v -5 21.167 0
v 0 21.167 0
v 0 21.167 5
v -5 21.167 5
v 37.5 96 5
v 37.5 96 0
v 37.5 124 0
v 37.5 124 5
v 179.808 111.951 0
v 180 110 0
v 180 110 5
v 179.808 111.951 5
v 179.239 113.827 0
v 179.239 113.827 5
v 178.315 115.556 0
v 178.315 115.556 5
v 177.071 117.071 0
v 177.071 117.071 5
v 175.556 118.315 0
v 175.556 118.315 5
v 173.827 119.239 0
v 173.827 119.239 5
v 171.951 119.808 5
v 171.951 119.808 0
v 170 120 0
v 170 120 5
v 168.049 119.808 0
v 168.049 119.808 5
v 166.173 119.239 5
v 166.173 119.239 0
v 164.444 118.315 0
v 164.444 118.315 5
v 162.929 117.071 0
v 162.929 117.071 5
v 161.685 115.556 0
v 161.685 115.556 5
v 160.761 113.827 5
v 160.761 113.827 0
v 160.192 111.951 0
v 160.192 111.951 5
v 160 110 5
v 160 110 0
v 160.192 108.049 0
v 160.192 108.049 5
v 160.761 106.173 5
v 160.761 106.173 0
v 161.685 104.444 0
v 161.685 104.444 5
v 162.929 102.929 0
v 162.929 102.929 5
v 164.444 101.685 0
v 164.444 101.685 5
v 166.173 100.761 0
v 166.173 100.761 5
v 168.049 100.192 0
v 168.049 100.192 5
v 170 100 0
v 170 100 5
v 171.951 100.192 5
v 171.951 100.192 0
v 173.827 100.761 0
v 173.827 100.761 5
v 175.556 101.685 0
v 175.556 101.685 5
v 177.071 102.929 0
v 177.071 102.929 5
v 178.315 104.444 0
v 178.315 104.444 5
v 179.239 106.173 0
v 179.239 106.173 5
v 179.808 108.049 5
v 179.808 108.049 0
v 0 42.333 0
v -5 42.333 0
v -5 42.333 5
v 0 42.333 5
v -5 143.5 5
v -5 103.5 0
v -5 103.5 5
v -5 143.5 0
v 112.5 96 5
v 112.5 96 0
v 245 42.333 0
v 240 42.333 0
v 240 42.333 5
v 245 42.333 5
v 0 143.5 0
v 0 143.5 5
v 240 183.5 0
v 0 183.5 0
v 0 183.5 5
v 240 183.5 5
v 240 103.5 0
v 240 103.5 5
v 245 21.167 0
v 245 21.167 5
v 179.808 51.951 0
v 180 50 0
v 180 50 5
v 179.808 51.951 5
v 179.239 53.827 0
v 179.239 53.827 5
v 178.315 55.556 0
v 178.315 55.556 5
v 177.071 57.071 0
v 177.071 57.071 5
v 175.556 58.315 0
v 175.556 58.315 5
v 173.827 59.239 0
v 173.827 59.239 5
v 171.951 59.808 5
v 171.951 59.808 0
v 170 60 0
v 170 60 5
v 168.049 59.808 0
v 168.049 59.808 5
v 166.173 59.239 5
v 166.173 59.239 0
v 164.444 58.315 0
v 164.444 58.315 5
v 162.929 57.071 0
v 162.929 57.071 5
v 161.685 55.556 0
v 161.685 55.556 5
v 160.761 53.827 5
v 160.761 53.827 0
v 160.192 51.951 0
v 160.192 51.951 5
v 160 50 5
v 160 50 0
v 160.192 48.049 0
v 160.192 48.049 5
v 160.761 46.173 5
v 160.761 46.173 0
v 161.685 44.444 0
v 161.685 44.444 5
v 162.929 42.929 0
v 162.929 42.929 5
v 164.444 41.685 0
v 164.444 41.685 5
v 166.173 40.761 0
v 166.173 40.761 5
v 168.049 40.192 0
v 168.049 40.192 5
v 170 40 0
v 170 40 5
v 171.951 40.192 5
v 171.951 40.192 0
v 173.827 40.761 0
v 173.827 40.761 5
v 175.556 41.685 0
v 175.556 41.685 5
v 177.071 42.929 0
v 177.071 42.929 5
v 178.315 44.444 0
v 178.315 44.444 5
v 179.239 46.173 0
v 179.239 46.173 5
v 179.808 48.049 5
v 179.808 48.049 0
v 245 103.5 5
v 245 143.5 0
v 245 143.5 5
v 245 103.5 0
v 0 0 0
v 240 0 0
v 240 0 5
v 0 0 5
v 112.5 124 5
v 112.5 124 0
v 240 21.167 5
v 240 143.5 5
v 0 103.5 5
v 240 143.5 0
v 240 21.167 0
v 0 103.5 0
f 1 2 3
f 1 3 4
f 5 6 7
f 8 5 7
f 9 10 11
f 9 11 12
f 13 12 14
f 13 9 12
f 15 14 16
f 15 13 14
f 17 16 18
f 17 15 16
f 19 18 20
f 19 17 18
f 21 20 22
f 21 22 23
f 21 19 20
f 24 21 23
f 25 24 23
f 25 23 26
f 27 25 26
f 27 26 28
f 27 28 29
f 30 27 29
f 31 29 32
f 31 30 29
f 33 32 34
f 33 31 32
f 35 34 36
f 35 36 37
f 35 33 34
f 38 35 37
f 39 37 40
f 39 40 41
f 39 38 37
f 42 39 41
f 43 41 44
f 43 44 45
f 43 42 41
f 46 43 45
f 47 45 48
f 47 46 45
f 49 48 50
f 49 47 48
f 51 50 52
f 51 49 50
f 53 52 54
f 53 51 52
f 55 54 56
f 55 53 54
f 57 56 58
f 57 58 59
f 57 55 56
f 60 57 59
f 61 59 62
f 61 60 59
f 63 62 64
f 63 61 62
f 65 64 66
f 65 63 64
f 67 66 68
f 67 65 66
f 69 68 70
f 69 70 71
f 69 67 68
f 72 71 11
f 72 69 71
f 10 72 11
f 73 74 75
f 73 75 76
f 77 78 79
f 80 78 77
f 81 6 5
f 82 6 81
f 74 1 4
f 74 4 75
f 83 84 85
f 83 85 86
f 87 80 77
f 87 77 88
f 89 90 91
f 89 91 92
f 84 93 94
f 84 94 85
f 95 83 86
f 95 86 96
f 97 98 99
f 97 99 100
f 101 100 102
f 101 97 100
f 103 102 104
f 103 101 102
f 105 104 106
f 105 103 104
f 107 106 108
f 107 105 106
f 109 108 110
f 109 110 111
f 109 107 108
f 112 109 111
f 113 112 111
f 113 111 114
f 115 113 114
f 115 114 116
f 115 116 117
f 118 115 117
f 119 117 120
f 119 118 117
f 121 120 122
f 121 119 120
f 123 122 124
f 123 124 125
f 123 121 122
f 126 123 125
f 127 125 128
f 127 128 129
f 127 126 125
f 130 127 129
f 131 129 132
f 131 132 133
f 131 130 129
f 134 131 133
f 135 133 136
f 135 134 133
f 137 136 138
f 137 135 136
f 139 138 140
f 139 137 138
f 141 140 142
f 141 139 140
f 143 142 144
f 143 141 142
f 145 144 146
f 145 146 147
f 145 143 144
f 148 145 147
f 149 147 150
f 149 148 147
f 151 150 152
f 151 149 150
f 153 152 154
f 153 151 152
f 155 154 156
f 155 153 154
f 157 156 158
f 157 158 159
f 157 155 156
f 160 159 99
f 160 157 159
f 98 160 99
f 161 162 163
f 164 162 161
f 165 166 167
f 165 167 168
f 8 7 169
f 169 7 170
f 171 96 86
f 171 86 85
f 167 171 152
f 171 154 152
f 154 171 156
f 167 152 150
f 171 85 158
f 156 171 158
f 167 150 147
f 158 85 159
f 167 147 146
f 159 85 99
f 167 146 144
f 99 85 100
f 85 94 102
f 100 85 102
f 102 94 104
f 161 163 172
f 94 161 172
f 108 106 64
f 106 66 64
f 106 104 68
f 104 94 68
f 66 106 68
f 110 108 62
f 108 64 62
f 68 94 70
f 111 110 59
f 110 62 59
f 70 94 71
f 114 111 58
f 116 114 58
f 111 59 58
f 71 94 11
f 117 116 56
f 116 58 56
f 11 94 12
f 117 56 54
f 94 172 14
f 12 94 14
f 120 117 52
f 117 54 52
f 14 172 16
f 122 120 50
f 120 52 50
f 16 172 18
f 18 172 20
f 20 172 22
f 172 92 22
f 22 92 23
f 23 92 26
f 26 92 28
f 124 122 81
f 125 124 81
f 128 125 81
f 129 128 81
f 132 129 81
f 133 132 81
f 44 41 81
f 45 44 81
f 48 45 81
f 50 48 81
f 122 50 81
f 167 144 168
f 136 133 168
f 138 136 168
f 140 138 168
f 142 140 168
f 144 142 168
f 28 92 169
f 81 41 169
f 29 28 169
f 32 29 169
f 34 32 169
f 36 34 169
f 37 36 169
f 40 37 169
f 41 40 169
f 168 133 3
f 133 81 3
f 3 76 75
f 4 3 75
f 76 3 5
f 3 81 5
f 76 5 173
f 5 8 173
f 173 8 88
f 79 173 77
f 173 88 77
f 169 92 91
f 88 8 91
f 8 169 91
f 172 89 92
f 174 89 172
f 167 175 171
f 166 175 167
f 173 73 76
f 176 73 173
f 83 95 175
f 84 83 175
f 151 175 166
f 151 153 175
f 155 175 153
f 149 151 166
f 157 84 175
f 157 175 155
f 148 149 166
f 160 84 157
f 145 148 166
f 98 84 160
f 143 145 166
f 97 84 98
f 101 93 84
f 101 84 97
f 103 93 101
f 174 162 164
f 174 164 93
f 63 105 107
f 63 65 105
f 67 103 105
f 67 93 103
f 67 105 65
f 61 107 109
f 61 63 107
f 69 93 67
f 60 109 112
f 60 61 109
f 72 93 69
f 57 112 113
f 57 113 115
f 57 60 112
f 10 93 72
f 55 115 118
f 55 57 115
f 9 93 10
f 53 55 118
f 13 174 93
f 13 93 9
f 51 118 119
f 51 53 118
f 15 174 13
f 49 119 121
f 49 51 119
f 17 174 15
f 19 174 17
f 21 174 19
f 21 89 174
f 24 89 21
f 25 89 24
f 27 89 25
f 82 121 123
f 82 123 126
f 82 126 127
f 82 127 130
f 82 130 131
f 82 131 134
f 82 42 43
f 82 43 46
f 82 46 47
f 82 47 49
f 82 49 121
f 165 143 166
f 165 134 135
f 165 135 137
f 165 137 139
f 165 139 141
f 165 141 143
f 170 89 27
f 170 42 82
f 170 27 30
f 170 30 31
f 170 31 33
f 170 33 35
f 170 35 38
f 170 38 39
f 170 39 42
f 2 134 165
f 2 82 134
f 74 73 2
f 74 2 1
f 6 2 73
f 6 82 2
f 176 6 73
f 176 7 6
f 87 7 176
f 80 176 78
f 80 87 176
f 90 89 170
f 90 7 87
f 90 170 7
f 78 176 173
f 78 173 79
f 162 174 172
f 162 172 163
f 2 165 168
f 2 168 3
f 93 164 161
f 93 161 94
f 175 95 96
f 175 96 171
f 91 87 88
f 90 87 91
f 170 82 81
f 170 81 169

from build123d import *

# Parameters (mm, degrees)
ESQUISSE1_R        = 10
ESQUISSE1_W        = 75
ESQUISSE1_H        = 28
BOSS_EXTRU_1_DEPTH = 5


with BuildPart() as part:
    # Esquisse1 → Boss.-Extru.1 (new body)
    with BuildSketch(Plane.XY):
        Polygon((0, 143.5), (0, 183.5), (240, 183.5), (240, 143.5), (245, 143.5), (245, 103.5), (240, 103.5), (240, 42.333333333), (245, 42.333333333), (245, 21.166666667), (240, 21.166666667), (240, 0), (0, 0), (0, 21.166666667), (-5, 21.166666667), (-5, 42.333333333), (0, 42.333333333), (0, 103.5), (-5, 103.5), (-5, 143.5), align=None)
        with Locations((170, 110)):
            Circle(ESQUISSE1_R, mode=Mode.SUBTRACT)
        with Locations((170, 50)):
            Circle(ESQUISSE1_R, mode=Mode.SUBTRACT)
        with Locations((75, 110)):
            Rectangle(ESQUISSE1_W, ESQUISSE1_H, mode=Mode.SUBTRACT)
    extrude(amount=BOSS_EXTRU_1_DEPTH)


solid = part.part
